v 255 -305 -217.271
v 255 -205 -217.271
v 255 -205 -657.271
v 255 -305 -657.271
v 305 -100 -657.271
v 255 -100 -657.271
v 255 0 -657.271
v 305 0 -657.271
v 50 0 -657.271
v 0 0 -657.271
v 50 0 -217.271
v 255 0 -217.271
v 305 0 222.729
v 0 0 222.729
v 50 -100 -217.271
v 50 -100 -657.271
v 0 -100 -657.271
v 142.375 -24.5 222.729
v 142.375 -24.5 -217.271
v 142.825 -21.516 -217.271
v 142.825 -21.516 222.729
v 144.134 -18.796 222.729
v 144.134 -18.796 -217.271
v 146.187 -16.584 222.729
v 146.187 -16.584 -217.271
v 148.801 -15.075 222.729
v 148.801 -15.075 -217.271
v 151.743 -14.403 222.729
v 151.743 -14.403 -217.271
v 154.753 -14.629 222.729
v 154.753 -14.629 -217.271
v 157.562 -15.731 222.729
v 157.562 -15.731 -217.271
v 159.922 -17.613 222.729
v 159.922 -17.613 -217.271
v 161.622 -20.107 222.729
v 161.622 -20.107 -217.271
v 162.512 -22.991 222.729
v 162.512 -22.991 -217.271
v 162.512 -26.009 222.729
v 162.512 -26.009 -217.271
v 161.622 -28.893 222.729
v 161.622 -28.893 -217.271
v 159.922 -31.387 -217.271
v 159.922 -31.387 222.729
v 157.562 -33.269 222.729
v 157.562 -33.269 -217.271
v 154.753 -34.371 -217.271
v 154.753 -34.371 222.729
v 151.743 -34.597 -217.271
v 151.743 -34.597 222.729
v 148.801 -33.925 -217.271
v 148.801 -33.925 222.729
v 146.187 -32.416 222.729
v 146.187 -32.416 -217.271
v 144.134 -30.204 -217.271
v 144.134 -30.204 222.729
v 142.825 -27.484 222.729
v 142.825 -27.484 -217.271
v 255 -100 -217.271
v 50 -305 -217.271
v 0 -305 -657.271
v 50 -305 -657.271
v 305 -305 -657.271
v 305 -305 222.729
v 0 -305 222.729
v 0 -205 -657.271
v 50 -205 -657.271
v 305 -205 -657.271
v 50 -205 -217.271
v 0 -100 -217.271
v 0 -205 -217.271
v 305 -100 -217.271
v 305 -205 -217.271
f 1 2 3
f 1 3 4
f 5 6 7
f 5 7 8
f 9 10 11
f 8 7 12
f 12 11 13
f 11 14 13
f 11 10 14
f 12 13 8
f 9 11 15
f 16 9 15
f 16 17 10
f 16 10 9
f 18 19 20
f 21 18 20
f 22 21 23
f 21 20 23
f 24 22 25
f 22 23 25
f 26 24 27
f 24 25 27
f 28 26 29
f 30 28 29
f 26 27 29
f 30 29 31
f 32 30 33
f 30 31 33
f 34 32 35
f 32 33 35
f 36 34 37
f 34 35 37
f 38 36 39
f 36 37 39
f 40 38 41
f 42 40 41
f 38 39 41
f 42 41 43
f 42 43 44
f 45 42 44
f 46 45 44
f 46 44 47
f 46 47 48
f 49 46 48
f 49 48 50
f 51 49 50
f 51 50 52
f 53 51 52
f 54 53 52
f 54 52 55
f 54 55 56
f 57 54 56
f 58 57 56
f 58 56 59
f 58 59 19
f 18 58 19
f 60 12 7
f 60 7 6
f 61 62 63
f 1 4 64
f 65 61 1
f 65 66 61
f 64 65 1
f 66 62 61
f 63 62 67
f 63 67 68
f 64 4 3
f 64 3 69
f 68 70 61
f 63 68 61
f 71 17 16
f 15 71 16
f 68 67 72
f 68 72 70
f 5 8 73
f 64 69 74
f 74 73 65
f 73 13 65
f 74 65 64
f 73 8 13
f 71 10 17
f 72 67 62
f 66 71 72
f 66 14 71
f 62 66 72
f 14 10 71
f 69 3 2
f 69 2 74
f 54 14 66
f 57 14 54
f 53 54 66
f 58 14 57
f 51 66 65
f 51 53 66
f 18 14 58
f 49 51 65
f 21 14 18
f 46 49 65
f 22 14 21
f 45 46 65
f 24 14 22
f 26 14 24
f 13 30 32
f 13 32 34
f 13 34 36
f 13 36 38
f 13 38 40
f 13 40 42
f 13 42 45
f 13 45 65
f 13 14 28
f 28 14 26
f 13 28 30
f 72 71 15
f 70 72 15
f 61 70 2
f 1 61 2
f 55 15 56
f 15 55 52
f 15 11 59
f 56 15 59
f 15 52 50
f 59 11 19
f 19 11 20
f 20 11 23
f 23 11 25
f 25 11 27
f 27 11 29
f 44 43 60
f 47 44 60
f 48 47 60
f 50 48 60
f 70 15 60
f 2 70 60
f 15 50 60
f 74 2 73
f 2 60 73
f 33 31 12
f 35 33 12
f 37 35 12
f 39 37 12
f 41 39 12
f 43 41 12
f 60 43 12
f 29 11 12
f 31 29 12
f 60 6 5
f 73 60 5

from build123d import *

# Parameters (mm, degrees)
F0_W     = 305
F0_H     = 440
F1_DEPTH = 305
F3_D     = 20.25
F4_W     = 50
F4_H     = 100
F5_DEPTH = 440
F6_DEPTH = 440


with BuildPart() as f1:
    # F0 (on Front) → F1 (new body)
    with BuildSketch(Plane.XZ):
        with Locations((152.5, 2.728686)):
            Rectangle(F0_W, F0_H)
    extrude(amount=F1_DEPTH)

    # F3 (through all)
    with Locations(Plane.XY.offset(222.728686)):
        with Locations((152.5, -24.5)):
            Hole(F3_D / 2)

    # F4 (on face) → F5 (join)
    with BuildSketch(Plane(origin=(0, 0, -217.271314), x_dir=(1, 0, 0), z_dir=(0, 0, -1))):
        with Locations((25, 255)):
            Rectangle(F4_W, F4_H)
    extrude(amount=F5_DEPTH)

    # F4 (on face) → F6 (join)
    with BuildSketch(Plane(origin=(0, 0, -217.271314), x_dir=(1, 0, 0), z_dir=(0, 0, -1))):
        with Locations((280, 255)):
            Rectangle(F4_W, F4_H)
        with Locations((280, 50)):
            Rectangle(F4_W, F4_H)
        with Locations((25, 50)):
            Rectangle(F4_W, F4_H)
    extrude(amount=F6_DEPTH)


solid = f1.part
